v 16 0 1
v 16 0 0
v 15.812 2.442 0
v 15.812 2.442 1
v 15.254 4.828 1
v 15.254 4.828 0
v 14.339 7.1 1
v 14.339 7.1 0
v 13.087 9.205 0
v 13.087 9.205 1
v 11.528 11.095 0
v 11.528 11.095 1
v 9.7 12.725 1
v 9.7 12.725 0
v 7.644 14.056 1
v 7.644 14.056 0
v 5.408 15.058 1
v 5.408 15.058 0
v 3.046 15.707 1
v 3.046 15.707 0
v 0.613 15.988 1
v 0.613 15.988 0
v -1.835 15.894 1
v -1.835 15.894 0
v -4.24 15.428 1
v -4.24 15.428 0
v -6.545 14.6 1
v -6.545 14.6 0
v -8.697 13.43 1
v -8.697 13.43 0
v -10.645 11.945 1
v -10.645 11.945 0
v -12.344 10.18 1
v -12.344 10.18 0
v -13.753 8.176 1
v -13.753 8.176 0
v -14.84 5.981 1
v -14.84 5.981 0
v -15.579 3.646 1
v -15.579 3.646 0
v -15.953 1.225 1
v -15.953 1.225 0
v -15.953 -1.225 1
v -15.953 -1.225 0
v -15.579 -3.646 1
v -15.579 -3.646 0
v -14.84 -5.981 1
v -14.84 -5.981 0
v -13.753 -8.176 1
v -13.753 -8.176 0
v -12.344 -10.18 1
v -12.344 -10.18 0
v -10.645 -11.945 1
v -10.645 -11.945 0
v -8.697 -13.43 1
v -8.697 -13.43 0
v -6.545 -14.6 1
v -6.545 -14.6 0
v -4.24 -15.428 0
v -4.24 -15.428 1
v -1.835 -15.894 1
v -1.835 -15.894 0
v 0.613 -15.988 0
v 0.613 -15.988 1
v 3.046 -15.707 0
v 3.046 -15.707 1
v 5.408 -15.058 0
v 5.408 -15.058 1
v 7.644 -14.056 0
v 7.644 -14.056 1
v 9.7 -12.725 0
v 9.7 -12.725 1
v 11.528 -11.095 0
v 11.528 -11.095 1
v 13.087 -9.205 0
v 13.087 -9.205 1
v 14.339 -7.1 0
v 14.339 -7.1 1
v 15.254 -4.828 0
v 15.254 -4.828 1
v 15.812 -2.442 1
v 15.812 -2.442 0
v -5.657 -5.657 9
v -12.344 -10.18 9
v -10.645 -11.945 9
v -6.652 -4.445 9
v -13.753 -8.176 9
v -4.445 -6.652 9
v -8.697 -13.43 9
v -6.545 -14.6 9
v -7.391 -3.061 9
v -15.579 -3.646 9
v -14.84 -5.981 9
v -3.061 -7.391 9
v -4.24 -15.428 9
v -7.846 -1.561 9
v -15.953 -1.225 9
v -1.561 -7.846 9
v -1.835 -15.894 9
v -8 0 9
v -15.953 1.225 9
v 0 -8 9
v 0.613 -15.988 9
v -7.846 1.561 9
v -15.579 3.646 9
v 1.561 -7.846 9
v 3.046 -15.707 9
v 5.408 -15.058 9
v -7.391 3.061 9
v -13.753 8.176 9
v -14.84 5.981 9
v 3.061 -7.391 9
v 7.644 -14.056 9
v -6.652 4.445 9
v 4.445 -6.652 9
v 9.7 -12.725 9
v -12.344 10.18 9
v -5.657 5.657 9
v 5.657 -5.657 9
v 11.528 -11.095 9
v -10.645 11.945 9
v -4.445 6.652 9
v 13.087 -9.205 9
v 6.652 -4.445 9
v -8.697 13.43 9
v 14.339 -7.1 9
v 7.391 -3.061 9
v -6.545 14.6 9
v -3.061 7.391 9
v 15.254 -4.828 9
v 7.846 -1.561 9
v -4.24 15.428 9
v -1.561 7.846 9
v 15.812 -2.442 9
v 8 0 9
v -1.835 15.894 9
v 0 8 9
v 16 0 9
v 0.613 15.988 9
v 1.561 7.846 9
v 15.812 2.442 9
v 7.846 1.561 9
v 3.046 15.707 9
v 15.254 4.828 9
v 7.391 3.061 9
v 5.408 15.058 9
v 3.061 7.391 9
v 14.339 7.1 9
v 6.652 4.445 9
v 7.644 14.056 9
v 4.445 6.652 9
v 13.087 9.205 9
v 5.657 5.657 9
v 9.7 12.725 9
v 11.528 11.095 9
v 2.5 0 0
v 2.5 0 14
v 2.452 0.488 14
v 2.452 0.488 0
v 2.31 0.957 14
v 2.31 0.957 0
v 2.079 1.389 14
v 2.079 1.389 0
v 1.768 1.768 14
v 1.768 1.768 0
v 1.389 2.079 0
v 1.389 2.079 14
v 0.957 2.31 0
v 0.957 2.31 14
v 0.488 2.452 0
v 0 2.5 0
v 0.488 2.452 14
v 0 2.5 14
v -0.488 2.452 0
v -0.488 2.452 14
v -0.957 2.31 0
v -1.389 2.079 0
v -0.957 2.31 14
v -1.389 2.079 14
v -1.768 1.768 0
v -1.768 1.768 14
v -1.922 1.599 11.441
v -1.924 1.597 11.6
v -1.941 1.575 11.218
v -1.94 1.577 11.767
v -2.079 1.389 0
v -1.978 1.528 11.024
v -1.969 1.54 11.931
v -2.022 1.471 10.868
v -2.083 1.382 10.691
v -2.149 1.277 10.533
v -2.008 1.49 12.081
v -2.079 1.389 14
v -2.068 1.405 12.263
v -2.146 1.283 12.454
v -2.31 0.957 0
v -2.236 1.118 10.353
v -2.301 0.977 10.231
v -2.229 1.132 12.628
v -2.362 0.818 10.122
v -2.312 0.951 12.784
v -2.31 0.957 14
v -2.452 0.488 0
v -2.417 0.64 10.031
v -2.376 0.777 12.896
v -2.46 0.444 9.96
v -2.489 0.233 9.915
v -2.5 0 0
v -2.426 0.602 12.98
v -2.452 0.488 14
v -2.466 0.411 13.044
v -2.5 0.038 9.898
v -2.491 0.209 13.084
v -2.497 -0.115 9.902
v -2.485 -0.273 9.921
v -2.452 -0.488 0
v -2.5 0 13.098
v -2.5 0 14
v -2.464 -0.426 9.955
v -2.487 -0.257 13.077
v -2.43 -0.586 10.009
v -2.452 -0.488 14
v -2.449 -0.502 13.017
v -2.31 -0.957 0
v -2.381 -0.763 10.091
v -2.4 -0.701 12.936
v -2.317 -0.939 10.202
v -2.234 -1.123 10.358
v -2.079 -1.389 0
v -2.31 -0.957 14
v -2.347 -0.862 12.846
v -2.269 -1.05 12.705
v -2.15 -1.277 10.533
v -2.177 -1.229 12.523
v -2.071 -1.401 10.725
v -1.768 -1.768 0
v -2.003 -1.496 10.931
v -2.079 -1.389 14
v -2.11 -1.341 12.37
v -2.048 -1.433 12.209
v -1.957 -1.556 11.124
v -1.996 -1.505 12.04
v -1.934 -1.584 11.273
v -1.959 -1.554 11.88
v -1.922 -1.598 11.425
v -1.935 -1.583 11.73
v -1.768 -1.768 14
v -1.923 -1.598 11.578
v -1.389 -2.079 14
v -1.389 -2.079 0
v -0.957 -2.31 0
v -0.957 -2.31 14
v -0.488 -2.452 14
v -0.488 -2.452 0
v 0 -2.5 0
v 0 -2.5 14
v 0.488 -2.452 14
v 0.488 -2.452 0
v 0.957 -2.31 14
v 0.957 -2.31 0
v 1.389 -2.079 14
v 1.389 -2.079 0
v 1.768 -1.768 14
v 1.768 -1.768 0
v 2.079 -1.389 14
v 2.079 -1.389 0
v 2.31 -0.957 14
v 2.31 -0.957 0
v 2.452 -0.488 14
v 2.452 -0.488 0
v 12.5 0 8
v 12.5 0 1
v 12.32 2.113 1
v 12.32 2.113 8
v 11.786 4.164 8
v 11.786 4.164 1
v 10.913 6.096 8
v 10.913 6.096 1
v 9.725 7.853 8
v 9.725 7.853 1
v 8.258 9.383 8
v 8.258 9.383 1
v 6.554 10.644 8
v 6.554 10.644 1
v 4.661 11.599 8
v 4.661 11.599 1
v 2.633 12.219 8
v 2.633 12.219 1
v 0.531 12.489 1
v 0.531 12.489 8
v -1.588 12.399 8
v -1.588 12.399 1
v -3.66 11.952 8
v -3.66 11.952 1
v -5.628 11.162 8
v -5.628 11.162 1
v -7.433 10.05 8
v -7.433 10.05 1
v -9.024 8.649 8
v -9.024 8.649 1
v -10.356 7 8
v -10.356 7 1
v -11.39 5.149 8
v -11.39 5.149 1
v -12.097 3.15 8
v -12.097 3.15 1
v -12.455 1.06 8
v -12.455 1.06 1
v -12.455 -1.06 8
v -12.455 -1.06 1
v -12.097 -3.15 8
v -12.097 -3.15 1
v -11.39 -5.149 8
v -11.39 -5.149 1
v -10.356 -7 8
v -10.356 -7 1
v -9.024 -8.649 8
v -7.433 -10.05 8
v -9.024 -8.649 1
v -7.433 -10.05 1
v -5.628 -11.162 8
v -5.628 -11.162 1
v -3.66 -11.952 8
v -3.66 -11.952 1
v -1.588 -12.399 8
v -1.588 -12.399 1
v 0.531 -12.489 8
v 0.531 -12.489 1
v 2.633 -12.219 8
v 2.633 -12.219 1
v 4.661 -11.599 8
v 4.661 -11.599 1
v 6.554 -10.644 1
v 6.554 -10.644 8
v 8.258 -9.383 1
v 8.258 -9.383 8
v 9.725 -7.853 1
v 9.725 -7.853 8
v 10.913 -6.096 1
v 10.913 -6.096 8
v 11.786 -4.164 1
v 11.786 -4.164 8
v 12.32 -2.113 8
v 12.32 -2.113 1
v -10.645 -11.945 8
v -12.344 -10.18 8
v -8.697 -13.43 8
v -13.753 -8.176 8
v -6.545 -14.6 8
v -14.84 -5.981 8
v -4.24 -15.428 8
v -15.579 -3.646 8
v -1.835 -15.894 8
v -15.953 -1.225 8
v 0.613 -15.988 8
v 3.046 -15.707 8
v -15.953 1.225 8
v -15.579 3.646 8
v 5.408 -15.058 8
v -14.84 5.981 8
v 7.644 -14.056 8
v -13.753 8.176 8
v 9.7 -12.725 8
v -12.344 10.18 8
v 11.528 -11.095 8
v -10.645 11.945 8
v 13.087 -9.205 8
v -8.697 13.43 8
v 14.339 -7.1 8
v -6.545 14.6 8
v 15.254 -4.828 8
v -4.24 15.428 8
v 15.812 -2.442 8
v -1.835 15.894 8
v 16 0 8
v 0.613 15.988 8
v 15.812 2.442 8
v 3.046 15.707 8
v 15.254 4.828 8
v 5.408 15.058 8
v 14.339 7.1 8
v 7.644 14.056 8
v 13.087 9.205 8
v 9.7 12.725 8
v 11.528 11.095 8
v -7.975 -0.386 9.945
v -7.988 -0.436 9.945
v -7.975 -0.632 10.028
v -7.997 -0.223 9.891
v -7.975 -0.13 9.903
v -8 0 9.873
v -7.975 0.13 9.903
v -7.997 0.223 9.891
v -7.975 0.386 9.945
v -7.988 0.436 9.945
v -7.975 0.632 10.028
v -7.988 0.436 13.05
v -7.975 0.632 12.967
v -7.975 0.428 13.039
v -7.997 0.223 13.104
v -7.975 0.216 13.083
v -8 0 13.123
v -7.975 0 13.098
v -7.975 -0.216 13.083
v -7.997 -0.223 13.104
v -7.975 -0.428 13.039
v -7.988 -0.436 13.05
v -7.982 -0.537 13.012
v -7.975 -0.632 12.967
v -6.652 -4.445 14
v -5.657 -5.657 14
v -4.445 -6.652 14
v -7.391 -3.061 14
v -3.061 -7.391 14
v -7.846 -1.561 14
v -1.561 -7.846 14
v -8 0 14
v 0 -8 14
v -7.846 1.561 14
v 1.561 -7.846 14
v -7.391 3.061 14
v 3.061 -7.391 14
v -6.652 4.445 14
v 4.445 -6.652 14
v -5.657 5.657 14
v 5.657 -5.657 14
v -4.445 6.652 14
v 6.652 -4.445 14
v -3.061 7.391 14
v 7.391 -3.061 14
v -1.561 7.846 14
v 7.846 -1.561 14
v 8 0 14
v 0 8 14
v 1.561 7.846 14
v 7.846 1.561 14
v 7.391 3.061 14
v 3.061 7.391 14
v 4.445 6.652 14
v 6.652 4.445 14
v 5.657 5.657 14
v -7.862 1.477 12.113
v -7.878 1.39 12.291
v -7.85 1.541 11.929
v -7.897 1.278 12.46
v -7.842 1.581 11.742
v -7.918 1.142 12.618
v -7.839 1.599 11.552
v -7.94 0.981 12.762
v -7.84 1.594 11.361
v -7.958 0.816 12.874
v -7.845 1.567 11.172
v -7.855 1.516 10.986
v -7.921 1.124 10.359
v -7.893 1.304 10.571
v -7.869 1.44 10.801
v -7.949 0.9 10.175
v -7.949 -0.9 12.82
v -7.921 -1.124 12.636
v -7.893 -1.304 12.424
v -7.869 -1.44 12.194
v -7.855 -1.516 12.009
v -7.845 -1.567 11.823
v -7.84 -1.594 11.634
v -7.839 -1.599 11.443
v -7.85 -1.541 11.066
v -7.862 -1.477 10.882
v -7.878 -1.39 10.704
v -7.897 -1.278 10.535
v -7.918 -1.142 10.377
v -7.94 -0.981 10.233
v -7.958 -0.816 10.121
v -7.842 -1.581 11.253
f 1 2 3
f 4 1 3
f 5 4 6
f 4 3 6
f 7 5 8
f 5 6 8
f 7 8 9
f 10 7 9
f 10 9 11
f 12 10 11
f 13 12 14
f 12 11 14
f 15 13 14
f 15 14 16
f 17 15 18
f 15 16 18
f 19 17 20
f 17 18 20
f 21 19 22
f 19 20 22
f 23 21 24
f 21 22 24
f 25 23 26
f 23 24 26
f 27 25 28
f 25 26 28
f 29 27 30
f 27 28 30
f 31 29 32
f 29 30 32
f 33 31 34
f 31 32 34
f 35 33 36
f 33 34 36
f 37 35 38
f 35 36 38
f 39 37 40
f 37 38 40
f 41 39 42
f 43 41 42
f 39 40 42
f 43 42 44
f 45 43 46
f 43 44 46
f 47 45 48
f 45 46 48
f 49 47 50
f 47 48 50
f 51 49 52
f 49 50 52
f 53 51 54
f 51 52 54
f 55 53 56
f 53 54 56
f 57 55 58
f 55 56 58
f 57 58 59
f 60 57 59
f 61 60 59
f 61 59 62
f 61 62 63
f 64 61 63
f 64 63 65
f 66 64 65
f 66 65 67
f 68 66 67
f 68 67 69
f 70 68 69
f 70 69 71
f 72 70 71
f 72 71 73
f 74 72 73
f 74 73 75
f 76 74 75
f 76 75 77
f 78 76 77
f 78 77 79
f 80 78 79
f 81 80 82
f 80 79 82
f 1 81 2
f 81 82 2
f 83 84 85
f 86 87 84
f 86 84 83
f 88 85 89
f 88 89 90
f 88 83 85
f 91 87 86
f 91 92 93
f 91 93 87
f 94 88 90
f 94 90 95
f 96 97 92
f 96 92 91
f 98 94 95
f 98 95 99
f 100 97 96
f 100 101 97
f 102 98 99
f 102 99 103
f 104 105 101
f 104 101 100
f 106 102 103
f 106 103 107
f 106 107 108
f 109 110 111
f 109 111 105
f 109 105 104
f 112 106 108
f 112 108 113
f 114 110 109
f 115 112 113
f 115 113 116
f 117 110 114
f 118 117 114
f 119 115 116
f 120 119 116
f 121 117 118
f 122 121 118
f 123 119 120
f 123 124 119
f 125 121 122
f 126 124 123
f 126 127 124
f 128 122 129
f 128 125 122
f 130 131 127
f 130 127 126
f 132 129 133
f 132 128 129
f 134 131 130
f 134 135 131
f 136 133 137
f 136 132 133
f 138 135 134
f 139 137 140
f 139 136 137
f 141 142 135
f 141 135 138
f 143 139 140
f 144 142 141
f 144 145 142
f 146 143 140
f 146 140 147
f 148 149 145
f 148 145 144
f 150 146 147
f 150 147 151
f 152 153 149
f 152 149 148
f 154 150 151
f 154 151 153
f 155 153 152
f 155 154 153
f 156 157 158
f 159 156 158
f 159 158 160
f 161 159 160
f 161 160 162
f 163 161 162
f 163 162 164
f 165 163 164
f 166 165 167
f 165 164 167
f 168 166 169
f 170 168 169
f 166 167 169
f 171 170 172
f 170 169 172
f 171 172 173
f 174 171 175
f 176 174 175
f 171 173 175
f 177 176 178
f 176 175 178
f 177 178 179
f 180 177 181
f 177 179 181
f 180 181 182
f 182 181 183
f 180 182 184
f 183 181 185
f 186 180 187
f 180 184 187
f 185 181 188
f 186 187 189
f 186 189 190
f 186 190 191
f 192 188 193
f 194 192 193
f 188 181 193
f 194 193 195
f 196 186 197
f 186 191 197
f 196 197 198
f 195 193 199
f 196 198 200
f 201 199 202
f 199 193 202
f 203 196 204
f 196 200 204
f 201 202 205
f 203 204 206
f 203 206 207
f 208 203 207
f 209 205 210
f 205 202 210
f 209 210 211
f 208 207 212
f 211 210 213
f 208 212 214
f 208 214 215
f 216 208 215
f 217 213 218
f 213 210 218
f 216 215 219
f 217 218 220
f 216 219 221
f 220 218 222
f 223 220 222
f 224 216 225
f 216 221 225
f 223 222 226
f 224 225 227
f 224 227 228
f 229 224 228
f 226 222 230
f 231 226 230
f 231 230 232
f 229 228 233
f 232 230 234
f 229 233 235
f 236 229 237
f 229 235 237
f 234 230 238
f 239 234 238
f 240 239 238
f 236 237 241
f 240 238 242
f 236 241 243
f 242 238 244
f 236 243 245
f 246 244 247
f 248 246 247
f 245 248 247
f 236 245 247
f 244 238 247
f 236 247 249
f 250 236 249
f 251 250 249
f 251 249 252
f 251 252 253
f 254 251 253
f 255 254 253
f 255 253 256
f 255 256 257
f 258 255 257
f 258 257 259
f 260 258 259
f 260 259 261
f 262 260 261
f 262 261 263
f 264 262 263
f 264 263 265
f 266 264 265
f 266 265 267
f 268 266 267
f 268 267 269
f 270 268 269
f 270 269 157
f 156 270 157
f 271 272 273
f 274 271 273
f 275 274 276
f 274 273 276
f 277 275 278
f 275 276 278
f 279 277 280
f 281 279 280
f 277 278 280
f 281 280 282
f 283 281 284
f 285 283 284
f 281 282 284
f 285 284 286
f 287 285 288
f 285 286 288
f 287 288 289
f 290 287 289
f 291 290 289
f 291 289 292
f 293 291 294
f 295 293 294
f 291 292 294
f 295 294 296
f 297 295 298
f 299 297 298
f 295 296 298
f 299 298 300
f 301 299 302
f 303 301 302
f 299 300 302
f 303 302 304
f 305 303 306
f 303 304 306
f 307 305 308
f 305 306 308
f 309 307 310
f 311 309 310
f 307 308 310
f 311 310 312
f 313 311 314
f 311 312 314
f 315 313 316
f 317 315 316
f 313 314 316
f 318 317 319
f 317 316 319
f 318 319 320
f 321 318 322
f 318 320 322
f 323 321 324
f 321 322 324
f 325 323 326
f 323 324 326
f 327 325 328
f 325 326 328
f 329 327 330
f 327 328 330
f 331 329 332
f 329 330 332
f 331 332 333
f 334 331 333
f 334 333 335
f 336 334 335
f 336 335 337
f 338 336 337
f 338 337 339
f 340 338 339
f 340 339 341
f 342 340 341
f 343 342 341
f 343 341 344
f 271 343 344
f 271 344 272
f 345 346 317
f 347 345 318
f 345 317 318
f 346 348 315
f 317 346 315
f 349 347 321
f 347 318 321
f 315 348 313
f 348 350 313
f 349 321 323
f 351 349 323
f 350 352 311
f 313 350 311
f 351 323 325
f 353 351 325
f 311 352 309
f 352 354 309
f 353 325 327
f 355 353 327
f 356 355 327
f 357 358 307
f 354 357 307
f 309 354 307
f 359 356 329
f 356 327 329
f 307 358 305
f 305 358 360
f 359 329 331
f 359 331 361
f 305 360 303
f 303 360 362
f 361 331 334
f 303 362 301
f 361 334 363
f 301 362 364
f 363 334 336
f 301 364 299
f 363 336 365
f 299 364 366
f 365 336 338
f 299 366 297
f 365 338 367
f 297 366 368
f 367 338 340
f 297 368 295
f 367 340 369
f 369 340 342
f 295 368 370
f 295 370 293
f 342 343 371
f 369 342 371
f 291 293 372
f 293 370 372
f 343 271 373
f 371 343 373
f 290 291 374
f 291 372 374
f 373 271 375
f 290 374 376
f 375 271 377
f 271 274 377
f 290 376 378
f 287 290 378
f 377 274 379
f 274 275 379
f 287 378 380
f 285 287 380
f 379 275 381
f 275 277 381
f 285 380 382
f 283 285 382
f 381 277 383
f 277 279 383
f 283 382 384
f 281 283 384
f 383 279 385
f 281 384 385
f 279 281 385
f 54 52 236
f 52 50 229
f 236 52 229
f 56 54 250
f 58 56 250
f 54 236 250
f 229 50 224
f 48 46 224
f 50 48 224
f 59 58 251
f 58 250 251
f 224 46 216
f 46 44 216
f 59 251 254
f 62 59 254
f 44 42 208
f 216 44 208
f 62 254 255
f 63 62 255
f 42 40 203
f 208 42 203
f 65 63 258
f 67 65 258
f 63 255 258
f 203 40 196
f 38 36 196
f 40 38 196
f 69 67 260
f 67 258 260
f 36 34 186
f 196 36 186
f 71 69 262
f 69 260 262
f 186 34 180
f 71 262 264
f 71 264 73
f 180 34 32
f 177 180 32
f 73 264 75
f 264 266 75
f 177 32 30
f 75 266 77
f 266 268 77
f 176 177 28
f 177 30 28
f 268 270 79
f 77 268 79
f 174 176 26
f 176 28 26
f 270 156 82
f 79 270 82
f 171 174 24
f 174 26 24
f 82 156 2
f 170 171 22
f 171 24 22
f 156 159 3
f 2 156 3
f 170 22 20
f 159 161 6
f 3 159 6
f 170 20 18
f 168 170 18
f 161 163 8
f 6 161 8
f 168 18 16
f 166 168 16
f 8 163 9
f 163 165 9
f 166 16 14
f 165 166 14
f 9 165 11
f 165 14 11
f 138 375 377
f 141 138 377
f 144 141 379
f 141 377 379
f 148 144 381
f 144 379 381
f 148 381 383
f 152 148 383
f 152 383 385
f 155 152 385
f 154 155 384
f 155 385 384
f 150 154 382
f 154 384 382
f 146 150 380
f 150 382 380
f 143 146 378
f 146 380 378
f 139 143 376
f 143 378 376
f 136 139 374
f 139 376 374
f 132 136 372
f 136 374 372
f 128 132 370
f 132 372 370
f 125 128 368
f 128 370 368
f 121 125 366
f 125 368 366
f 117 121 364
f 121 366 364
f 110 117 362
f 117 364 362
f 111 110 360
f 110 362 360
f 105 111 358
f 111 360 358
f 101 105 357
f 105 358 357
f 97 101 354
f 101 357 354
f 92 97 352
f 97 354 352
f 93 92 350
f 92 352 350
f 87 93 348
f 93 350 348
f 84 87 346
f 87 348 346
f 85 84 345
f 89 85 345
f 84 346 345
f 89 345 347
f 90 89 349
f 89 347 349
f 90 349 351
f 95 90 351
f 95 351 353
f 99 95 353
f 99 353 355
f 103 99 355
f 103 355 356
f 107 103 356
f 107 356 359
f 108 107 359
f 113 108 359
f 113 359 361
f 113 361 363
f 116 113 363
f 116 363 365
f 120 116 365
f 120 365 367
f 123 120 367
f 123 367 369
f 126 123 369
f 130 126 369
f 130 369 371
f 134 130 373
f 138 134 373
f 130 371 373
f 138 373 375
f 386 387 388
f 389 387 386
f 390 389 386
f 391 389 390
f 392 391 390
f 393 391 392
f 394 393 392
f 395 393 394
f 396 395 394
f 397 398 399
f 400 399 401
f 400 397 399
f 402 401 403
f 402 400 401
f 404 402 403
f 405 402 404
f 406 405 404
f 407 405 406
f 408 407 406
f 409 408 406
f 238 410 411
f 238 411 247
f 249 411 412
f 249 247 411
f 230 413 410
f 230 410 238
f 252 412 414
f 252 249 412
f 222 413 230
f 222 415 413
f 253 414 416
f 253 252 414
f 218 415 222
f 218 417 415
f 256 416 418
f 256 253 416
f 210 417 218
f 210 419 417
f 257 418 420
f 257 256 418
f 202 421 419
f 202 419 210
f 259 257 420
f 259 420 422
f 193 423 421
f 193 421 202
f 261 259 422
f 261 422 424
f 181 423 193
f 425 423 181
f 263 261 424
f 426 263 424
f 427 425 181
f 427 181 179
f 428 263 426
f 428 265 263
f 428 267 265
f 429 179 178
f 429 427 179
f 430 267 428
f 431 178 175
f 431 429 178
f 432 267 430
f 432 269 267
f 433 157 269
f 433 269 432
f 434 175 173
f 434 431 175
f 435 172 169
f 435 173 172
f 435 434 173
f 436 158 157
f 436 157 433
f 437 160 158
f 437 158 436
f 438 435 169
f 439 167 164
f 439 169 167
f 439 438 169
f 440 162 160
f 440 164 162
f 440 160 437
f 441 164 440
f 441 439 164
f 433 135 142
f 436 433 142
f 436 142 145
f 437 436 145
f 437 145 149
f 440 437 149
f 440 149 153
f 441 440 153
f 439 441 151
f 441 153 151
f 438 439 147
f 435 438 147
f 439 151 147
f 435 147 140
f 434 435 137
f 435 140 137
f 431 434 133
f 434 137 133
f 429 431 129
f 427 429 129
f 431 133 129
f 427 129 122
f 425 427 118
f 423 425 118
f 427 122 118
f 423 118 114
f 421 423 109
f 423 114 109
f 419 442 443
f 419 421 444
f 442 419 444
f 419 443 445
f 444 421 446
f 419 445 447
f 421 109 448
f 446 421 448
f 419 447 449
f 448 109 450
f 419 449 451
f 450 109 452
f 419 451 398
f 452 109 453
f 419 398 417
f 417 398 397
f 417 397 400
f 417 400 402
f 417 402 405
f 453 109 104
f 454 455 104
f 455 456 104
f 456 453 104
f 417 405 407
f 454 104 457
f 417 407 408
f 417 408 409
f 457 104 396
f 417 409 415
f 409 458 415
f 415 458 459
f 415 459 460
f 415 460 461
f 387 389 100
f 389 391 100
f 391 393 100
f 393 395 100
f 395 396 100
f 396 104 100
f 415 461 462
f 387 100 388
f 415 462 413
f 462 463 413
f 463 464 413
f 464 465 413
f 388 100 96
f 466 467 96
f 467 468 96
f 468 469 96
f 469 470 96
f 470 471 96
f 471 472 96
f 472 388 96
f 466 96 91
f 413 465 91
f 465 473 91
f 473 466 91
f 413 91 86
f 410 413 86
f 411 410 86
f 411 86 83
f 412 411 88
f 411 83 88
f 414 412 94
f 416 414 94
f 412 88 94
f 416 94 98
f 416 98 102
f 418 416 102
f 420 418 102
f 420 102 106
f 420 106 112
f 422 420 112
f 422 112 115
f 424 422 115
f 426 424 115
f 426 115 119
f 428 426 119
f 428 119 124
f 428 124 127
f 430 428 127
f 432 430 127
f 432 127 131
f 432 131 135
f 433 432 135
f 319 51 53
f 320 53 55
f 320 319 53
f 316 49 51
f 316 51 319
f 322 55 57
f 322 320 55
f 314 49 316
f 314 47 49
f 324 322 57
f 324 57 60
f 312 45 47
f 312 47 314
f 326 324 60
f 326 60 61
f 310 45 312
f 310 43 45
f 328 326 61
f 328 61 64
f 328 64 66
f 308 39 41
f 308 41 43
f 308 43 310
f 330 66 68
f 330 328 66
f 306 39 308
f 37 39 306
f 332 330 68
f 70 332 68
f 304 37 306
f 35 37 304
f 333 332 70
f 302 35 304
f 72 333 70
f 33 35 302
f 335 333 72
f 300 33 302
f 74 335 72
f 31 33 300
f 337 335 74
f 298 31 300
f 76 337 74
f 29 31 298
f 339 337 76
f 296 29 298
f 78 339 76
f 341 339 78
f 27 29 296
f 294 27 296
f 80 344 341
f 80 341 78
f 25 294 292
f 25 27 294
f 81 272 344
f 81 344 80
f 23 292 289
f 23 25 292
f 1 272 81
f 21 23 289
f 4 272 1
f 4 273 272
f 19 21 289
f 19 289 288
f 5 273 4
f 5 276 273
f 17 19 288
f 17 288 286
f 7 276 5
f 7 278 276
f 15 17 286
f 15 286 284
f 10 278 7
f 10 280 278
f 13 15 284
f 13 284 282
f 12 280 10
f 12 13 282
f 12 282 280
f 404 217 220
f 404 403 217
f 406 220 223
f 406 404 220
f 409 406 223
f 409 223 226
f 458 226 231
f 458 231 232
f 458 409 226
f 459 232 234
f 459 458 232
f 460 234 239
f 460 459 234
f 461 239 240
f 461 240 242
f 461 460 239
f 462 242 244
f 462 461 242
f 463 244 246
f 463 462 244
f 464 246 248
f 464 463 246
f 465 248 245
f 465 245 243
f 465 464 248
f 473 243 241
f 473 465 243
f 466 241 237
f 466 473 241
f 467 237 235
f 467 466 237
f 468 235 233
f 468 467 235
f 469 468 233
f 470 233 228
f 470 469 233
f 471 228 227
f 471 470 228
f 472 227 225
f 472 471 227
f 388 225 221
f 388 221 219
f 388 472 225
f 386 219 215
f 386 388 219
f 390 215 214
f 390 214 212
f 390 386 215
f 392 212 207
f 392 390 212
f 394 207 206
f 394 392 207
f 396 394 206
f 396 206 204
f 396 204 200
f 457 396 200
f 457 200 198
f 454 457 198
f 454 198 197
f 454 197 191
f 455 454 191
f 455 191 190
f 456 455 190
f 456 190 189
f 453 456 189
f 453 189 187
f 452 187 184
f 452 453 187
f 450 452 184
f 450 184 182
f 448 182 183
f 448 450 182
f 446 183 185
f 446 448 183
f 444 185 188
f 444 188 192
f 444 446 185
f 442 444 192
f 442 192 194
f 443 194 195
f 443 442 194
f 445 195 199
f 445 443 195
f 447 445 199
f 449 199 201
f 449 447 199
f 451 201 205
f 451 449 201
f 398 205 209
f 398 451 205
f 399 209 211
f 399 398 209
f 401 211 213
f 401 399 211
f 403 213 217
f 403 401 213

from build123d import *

# Parameters (mm, degrees)
ESQUISSE1_R             = 16
BOSS_EXTRU_1_DEPTH      = 1
ESQUISSE2_R             = 12.5
BOSS_EXTRU_2_DEPTH      = 7
ESQUISSE3_R             = 16
BOSS_EXTRU_3_DEPTH      = 1
ESQUISSE4_R             = 8
BOSS_EXTRU_4_DEPTH      = 5
ESQUISSE5_R             = 2.5
ENL_V_MAT_EXTRU_1_DEPTH = 15


with BuildPart() as part:
    # Esquisse1 → Boss.-Extru.1 (new body)
    with BuildSketch(Plane.XY):
        Circle(ESQUISSE1_R)
    extrude(amount=BOSS_EXTRU_1_DEPTH)

    # Esquisse2 → Boss.-Extru.2 (add)
    with BuildSketch(Plane.XY.offset(1)):
        Circle(ESQUISSE2_R)
    extrude(amount=BOSS_EXTRU_2_DEPTH)

    # Esquisse3 → Boss.-Extru.3 (add)
    with BuildSketch(Plane.XY.offset(8)):
        Circle(ESQUISSE3_R)
    extrude(amount=BOSS_EXTRU_3_DEPTH)

    # Esquisse4 → Boss.-Extru.4 (add)
    with BuildSketch(Plane.XY.offset(9)):
        Circle(ESQUISSE4_R)
    extrude(amount=BOSS_EXTRU_4_DEPTH)

    # Esquisse5 → Enlèv. mat.-Extru.1 (cut, through all)
    with BuildSketch(Plane.XY.offset(14)):
        Circle(ESQUISSE5_R)
    extrude(amount=-ENL_V_MAT_EXTRU_1_DEPTH, mode=Mode.SUBTRACT)

    # Esquisse7 → Dégagement M31 (revolve, cut)
    with BuildSketch(Plane(origin=(-8, 0, 11.497538613), x_dir=(0, 0, 1), z_dir=(0, 1, 0))):
        Polygon((0, 0), (0, 8), (1.6, 8), (1.6, 0.025), (1.625, 0), align=None)
    revolve(axis=Axis((-14.35, 0, 11.497538613), (1, 0, 0)), mode=Mode.SUBTRACT)


solid = part.part
